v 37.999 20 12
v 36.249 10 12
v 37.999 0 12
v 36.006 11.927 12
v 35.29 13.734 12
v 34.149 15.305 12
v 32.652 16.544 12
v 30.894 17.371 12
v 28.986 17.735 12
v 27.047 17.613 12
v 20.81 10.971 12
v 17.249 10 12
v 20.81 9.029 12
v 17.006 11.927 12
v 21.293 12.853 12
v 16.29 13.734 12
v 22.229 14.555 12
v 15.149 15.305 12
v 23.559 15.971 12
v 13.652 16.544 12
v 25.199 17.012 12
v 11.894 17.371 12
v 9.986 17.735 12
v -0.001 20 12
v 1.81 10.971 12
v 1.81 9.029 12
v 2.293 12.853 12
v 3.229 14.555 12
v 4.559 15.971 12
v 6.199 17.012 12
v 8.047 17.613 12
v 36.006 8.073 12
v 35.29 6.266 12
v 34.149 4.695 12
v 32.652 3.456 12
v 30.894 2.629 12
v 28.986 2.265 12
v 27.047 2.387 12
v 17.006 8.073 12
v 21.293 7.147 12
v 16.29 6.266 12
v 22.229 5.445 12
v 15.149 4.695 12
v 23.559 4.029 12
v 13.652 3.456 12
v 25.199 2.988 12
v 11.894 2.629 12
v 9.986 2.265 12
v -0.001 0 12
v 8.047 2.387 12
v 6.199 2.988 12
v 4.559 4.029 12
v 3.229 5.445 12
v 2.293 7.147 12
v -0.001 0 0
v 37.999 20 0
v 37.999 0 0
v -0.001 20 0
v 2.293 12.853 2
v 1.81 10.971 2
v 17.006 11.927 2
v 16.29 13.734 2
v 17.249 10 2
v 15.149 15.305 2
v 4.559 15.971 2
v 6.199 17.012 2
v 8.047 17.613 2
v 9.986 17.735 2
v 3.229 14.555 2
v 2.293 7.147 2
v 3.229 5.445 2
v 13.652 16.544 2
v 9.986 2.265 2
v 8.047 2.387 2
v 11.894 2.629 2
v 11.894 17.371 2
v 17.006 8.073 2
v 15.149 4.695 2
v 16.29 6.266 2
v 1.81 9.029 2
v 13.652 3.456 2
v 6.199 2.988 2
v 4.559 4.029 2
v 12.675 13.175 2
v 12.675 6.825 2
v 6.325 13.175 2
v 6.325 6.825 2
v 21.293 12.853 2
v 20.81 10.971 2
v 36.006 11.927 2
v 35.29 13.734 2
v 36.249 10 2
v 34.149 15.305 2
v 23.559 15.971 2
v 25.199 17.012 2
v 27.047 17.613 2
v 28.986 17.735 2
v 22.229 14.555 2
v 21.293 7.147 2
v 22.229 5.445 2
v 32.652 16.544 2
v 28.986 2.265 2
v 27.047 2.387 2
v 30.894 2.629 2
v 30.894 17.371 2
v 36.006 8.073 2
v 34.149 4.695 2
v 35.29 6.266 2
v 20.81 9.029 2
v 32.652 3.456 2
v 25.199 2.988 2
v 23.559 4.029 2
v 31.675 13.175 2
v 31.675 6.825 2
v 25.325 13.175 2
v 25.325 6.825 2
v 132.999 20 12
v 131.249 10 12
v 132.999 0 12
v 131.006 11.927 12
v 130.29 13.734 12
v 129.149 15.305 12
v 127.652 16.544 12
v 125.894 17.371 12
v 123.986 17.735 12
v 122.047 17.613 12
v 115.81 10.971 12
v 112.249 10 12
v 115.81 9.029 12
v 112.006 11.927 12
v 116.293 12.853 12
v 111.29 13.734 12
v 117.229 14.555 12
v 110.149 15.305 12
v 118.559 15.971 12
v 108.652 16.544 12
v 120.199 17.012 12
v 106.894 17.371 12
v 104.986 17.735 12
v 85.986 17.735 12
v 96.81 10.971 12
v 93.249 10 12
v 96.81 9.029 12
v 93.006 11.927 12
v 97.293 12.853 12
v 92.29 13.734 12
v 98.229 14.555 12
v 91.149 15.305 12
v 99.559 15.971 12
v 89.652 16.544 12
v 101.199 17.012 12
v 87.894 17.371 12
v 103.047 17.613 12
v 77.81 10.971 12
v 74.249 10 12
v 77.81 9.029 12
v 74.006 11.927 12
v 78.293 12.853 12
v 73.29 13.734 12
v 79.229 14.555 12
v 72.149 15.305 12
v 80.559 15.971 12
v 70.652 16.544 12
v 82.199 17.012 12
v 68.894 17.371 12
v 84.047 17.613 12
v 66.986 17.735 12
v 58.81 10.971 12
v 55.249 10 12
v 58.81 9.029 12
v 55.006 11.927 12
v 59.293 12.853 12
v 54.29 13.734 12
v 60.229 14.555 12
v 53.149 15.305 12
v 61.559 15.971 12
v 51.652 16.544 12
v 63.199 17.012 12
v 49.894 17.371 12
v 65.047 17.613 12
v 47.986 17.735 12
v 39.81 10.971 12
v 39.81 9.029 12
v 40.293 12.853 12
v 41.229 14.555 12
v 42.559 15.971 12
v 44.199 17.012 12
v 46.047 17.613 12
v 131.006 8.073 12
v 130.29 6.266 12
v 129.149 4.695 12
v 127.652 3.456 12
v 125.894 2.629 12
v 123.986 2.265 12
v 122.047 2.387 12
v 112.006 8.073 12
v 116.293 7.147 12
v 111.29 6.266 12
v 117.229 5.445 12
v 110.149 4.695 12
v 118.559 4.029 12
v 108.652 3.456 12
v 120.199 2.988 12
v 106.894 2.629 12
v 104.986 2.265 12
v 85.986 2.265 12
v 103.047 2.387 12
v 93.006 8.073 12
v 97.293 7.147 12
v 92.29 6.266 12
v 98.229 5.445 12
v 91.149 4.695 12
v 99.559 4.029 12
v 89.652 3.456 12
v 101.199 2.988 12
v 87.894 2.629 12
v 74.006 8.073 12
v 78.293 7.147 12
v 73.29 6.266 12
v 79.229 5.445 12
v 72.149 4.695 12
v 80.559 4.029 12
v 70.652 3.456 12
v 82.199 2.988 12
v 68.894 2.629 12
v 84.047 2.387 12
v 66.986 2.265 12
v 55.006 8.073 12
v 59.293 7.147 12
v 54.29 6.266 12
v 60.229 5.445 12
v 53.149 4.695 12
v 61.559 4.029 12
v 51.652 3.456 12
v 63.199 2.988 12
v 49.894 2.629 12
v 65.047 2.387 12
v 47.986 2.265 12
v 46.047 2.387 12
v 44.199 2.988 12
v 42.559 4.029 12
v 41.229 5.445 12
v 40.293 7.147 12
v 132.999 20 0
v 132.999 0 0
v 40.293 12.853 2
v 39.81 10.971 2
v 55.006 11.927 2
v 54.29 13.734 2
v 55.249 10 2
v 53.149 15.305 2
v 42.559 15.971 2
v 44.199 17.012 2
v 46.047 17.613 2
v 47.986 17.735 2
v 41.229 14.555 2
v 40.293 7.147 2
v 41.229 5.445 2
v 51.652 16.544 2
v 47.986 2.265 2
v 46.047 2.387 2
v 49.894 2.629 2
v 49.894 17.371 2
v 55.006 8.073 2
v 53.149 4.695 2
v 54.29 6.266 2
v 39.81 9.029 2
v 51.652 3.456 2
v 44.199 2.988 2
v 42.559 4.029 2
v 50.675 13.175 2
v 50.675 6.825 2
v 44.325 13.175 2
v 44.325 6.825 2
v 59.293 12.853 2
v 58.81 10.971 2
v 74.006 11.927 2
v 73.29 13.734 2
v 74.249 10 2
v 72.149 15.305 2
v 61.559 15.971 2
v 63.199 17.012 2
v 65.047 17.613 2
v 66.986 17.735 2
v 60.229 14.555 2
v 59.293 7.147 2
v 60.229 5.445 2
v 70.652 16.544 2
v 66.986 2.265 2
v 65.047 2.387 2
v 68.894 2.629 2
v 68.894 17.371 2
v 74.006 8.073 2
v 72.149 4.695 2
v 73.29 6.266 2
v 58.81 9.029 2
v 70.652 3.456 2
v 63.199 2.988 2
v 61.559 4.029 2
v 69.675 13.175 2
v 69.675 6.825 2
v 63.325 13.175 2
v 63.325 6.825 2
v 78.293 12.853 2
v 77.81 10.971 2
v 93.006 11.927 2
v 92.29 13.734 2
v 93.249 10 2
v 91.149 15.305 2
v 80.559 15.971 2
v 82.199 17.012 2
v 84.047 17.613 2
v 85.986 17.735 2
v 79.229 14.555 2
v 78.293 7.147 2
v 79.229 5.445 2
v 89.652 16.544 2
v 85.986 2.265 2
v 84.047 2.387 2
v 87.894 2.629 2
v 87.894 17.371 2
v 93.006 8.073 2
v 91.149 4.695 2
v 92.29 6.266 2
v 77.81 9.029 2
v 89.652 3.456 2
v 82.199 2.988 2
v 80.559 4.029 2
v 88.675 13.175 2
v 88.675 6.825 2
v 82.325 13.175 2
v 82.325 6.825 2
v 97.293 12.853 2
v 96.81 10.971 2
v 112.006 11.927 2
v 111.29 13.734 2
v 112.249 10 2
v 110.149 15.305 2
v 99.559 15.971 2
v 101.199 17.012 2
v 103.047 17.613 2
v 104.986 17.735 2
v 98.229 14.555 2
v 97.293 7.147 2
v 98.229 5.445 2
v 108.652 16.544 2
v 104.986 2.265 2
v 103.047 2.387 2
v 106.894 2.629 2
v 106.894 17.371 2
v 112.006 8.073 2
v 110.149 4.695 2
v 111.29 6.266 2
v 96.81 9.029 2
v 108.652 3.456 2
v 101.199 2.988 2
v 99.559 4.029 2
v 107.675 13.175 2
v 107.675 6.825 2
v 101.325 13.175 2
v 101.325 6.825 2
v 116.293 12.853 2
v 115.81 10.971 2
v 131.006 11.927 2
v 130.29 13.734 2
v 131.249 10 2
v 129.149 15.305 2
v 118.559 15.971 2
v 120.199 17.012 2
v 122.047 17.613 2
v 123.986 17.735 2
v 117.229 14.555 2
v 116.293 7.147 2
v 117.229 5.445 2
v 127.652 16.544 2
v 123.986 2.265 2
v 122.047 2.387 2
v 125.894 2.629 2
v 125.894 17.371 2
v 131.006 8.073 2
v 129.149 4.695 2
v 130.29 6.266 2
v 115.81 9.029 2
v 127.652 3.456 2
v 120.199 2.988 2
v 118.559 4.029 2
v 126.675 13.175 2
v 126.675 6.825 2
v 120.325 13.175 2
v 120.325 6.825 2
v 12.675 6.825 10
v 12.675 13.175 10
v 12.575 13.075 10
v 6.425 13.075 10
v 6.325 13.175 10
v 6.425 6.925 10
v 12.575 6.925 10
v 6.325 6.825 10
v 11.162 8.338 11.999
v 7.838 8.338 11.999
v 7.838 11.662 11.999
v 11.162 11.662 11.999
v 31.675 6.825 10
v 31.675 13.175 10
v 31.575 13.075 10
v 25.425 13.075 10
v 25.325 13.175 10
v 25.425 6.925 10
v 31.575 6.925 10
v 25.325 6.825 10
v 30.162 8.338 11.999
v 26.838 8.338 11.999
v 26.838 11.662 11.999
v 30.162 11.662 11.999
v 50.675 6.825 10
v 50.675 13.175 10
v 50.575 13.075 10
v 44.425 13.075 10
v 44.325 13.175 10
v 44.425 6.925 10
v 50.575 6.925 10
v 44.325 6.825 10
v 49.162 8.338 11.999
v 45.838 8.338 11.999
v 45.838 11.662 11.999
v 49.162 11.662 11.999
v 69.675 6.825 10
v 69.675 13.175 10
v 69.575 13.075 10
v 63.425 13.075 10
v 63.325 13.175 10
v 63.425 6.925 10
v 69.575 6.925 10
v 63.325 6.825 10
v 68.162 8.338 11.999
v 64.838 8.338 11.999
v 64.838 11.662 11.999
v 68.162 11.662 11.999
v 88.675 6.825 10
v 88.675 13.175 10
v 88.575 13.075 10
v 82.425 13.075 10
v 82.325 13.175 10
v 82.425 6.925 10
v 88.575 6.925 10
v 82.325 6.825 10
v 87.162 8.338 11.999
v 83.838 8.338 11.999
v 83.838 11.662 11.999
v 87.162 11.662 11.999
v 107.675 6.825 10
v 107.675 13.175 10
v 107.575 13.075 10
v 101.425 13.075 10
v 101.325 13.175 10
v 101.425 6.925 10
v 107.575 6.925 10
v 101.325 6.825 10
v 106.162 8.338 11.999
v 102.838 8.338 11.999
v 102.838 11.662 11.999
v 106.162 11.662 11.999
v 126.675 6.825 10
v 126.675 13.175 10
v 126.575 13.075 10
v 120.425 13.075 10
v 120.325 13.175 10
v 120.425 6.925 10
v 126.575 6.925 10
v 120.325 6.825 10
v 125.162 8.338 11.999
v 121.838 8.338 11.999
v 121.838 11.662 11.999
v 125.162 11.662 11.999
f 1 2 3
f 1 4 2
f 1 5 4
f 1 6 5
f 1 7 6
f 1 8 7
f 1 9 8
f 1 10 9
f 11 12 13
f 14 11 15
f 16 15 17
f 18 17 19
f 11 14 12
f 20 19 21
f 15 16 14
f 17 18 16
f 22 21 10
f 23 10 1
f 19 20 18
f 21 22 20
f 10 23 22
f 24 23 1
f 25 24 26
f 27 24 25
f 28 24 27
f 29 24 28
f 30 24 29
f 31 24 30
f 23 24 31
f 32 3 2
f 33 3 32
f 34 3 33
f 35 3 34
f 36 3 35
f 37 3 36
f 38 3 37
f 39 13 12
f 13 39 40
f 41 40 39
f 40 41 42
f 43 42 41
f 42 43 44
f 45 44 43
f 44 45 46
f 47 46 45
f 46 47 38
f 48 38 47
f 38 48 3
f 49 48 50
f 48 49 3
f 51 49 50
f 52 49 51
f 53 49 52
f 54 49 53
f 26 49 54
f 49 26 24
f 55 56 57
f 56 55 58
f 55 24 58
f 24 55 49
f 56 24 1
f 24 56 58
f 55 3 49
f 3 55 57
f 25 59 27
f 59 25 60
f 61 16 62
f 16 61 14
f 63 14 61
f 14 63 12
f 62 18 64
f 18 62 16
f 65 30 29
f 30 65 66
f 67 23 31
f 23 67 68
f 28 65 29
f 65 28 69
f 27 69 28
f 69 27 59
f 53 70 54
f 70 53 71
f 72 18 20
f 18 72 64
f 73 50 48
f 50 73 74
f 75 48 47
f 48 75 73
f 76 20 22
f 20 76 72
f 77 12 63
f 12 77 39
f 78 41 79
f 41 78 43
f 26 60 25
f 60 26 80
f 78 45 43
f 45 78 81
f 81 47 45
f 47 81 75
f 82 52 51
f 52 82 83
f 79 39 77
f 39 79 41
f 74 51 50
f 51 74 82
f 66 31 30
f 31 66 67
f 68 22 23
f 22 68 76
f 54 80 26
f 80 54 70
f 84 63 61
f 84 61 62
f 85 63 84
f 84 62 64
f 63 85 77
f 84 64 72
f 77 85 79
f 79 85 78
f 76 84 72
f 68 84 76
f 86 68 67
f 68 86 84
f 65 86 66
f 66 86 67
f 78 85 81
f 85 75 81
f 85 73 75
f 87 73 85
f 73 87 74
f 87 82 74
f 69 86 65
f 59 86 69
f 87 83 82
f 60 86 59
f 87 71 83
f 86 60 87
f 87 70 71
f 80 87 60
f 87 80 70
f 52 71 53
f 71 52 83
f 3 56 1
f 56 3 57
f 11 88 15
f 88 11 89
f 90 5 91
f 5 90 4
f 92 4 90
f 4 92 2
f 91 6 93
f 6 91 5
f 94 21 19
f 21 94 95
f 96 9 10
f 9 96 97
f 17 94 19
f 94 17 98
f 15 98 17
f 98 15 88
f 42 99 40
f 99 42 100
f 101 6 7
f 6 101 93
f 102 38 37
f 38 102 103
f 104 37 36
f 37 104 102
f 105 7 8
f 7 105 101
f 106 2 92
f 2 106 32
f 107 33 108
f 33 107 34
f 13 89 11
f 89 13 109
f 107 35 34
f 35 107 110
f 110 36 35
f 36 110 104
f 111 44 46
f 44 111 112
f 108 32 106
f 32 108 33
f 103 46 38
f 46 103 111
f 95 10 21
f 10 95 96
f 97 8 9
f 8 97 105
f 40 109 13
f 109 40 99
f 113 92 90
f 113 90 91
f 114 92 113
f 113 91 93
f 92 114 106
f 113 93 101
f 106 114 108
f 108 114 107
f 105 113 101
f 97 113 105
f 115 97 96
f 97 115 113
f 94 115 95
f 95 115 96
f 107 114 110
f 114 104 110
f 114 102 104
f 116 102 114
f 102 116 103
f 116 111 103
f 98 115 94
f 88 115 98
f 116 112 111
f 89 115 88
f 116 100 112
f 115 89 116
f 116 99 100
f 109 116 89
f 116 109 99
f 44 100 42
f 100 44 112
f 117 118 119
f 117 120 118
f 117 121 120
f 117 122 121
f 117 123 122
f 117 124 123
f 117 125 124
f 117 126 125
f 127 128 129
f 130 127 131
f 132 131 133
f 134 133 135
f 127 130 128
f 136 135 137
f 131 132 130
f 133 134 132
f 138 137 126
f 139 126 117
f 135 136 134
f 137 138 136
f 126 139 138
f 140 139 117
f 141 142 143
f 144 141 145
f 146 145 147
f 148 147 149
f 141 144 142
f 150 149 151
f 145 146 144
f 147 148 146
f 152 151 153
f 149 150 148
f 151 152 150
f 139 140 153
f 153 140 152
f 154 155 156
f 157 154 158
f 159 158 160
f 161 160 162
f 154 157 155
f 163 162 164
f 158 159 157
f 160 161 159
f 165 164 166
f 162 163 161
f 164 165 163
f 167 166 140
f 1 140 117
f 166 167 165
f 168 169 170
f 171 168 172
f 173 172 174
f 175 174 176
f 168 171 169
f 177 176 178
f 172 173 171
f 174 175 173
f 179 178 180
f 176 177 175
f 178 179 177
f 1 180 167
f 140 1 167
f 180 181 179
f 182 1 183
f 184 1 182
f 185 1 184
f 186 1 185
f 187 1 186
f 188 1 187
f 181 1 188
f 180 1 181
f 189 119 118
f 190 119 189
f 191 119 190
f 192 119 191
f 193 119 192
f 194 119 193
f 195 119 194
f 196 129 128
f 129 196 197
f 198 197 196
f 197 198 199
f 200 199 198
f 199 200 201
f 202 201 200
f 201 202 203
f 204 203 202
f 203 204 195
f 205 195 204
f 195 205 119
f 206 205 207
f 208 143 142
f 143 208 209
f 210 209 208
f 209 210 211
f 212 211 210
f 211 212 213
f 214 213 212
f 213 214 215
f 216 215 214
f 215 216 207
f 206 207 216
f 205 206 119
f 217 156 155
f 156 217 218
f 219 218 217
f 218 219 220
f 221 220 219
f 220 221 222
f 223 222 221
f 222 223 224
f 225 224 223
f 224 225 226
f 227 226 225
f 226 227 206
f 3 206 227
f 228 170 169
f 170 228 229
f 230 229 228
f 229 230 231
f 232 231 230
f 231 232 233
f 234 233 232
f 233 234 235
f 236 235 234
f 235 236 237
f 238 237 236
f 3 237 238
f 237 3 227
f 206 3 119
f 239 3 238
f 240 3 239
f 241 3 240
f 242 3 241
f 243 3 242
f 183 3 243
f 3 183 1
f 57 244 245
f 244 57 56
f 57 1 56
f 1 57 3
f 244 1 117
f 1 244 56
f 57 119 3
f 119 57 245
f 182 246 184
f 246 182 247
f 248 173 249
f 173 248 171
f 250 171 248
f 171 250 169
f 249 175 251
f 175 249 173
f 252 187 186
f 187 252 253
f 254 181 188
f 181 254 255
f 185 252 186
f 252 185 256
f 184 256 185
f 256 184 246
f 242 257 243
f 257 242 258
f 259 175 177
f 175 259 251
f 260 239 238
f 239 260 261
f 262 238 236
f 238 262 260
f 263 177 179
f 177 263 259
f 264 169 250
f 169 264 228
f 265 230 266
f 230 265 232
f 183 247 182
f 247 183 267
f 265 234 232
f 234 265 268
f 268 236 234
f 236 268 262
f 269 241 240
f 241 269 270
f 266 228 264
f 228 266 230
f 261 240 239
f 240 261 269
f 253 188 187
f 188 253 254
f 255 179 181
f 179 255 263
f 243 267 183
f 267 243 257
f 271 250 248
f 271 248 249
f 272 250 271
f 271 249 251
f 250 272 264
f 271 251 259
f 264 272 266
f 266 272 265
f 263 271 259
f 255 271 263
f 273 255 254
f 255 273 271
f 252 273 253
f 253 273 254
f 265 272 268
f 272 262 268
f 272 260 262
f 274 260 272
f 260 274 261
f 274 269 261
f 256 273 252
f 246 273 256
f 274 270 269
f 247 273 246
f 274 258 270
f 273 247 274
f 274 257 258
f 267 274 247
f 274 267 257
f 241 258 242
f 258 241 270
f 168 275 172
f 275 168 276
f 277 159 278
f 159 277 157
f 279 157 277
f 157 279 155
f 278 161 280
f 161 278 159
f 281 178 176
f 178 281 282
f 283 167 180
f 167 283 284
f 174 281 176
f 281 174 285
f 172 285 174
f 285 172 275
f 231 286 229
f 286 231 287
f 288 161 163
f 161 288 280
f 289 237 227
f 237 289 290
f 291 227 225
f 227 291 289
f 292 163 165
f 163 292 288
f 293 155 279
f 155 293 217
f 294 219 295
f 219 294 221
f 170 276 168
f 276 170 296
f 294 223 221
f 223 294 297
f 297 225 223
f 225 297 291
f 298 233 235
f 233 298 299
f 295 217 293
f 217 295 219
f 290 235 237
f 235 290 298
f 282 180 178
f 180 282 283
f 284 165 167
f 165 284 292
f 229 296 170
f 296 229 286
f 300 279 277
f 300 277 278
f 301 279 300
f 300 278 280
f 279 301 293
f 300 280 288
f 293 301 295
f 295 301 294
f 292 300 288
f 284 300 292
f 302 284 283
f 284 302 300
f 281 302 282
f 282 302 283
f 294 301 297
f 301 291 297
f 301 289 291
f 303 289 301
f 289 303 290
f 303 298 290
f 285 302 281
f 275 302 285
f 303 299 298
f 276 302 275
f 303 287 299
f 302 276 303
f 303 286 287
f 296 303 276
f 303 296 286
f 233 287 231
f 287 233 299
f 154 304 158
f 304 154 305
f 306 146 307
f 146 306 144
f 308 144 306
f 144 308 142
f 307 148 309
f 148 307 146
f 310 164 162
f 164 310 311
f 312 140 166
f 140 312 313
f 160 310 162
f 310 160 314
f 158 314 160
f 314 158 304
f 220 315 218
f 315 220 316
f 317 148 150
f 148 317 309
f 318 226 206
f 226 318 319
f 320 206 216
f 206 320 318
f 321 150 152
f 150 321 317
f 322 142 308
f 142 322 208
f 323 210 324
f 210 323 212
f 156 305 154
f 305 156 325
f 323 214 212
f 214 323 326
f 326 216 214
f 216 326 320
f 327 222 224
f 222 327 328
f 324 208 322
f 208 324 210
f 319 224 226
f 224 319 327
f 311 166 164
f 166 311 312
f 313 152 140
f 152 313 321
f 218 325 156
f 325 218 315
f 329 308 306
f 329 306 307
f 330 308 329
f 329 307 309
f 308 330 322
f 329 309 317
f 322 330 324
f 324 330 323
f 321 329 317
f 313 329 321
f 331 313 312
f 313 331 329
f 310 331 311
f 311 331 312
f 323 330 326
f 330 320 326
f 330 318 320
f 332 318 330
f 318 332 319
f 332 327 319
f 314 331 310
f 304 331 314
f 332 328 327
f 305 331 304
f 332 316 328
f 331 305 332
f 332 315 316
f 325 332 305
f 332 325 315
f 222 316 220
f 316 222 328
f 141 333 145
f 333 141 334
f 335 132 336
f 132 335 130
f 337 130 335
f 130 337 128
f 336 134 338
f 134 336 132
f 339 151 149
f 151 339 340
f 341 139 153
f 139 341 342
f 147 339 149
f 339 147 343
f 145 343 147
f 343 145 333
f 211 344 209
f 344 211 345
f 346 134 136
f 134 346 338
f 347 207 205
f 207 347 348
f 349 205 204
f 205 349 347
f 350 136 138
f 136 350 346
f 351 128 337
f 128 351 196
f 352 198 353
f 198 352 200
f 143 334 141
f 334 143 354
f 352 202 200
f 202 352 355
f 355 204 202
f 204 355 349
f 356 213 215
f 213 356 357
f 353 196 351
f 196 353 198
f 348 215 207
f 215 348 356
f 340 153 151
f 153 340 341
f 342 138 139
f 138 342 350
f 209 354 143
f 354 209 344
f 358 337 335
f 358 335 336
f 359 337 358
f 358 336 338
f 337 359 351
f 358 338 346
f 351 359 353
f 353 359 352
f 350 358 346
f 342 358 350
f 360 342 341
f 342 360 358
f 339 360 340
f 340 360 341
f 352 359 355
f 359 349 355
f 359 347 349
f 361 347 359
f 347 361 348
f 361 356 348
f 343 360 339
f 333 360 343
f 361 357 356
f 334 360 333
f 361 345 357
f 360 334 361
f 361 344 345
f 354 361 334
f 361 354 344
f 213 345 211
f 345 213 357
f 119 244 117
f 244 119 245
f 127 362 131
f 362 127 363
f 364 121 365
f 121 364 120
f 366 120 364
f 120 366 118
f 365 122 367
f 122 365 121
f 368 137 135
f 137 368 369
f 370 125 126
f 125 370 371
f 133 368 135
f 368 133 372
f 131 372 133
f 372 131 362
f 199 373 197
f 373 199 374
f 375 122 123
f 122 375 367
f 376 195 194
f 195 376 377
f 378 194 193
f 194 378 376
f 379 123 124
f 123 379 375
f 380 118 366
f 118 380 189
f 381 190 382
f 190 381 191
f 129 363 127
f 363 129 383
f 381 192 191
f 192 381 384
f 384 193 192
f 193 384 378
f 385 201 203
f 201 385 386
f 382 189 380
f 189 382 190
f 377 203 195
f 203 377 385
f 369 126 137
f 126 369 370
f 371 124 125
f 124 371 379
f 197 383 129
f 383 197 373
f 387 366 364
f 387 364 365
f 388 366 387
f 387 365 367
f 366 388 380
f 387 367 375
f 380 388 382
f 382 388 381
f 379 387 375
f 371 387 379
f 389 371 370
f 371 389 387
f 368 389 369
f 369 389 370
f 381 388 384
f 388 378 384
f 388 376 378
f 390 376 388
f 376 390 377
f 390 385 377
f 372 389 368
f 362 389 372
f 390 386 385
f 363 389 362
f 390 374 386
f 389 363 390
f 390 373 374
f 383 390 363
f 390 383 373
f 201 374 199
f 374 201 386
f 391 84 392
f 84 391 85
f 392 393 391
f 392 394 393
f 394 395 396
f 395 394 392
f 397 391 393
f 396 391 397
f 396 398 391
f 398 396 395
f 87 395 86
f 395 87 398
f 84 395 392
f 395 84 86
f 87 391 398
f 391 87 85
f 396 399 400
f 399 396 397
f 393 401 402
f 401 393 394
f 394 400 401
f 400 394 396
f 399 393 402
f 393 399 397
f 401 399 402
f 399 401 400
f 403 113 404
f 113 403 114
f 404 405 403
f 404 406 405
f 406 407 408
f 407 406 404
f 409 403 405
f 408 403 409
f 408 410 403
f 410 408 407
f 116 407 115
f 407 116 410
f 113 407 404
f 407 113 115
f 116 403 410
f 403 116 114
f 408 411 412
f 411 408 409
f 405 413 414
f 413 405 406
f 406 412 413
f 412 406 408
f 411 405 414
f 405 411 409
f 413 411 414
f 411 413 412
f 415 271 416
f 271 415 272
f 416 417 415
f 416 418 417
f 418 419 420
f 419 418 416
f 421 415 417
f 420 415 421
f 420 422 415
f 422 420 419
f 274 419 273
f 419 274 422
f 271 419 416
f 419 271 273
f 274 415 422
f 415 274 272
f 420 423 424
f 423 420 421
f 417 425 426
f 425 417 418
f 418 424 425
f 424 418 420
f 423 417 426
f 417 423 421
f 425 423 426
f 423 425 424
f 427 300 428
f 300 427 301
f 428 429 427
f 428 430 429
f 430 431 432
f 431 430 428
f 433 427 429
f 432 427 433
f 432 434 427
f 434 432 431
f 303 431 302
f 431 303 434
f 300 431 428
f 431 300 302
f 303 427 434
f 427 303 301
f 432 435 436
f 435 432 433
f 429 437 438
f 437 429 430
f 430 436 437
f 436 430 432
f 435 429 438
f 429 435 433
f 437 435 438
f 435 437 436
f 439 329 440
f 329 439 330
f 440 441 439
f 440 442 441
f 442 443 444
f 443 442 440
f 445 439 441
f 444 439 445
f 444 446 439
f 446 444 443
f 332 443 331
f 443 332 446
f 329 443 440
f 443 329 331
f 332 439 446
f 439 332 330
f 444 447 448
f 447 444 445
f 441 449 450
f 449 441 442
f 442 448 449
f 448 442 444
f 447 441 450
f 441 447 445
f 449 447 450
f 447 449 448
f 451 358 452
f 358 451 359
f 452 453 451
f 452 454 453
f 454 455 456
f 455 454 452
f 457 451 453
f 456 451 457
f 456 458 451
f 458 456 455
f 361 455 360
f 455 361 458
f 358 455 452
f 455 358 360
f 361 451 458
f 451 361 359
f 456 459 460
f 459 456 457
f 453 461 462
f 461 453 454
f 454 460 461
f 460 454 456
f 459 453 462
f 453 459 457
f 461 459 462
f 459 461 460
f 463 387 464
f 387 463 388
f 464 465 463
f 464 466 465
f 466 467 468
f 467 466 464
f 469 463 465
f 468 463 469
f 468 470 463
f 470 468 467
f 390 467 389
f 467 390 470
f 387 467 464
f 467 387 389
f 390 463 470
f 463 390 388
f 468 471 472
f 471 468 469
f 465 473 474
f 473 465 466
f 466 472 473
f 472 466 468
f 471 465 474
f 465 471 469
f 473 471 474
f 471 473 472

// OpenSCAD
//user variables
socket_diameter = 14; // measured diameter of the sockets
number_of_sockets = 7;
overall_height = 12; // overall height of the organizer
spacing_offset = 2; // use this for sockets that are wider than the base of the socket

//constants
floor_depth = 2;
socket_nub = 6.35;

//calculated variables
overall_width = socket_diameter + 6;
overall_length = socket_diameter + spacing_offset + 3;
socket_hole_radius = (socket_diameter + 1.5) / 2;
socket_hole_depth = overall_height - floor_depth;

//for loop to create socket holders based on user input
for (i = [0:1:number_of_sockets - 1]) {
    // create holes
    translate(v = [overall_length * i - 0.001, 0, 0]) 
    difference() {
        cube([overall_length, overall_width, overall_height]);
        translate(v = [(overall_length / 2), (overall_width / 2), floor_depth])  
            cylinder(h = socket_hole_depth + 1, r = socket_hole_radius);
    }
    // add nubs
    translate(v = [((overall_length * i) + (overall_length / 2)), (overall_width / 2), (floor_depth + (socket_hole_depth / 2) - 2)])
        cube([socket_nub, socket_nub, socket_hole_depth], center = true);
    translate(v = [((overall_length * i) + (overall_length / 2)), (overall_width / 2), (floor_depth + (socket_hole_depth) - 2.001)])
        rotate([0, 0, 45])
        cylinder(h = 2, r1 = socket_nub - 2, r2 = socket_nub - 4, $fn = 4);
}
